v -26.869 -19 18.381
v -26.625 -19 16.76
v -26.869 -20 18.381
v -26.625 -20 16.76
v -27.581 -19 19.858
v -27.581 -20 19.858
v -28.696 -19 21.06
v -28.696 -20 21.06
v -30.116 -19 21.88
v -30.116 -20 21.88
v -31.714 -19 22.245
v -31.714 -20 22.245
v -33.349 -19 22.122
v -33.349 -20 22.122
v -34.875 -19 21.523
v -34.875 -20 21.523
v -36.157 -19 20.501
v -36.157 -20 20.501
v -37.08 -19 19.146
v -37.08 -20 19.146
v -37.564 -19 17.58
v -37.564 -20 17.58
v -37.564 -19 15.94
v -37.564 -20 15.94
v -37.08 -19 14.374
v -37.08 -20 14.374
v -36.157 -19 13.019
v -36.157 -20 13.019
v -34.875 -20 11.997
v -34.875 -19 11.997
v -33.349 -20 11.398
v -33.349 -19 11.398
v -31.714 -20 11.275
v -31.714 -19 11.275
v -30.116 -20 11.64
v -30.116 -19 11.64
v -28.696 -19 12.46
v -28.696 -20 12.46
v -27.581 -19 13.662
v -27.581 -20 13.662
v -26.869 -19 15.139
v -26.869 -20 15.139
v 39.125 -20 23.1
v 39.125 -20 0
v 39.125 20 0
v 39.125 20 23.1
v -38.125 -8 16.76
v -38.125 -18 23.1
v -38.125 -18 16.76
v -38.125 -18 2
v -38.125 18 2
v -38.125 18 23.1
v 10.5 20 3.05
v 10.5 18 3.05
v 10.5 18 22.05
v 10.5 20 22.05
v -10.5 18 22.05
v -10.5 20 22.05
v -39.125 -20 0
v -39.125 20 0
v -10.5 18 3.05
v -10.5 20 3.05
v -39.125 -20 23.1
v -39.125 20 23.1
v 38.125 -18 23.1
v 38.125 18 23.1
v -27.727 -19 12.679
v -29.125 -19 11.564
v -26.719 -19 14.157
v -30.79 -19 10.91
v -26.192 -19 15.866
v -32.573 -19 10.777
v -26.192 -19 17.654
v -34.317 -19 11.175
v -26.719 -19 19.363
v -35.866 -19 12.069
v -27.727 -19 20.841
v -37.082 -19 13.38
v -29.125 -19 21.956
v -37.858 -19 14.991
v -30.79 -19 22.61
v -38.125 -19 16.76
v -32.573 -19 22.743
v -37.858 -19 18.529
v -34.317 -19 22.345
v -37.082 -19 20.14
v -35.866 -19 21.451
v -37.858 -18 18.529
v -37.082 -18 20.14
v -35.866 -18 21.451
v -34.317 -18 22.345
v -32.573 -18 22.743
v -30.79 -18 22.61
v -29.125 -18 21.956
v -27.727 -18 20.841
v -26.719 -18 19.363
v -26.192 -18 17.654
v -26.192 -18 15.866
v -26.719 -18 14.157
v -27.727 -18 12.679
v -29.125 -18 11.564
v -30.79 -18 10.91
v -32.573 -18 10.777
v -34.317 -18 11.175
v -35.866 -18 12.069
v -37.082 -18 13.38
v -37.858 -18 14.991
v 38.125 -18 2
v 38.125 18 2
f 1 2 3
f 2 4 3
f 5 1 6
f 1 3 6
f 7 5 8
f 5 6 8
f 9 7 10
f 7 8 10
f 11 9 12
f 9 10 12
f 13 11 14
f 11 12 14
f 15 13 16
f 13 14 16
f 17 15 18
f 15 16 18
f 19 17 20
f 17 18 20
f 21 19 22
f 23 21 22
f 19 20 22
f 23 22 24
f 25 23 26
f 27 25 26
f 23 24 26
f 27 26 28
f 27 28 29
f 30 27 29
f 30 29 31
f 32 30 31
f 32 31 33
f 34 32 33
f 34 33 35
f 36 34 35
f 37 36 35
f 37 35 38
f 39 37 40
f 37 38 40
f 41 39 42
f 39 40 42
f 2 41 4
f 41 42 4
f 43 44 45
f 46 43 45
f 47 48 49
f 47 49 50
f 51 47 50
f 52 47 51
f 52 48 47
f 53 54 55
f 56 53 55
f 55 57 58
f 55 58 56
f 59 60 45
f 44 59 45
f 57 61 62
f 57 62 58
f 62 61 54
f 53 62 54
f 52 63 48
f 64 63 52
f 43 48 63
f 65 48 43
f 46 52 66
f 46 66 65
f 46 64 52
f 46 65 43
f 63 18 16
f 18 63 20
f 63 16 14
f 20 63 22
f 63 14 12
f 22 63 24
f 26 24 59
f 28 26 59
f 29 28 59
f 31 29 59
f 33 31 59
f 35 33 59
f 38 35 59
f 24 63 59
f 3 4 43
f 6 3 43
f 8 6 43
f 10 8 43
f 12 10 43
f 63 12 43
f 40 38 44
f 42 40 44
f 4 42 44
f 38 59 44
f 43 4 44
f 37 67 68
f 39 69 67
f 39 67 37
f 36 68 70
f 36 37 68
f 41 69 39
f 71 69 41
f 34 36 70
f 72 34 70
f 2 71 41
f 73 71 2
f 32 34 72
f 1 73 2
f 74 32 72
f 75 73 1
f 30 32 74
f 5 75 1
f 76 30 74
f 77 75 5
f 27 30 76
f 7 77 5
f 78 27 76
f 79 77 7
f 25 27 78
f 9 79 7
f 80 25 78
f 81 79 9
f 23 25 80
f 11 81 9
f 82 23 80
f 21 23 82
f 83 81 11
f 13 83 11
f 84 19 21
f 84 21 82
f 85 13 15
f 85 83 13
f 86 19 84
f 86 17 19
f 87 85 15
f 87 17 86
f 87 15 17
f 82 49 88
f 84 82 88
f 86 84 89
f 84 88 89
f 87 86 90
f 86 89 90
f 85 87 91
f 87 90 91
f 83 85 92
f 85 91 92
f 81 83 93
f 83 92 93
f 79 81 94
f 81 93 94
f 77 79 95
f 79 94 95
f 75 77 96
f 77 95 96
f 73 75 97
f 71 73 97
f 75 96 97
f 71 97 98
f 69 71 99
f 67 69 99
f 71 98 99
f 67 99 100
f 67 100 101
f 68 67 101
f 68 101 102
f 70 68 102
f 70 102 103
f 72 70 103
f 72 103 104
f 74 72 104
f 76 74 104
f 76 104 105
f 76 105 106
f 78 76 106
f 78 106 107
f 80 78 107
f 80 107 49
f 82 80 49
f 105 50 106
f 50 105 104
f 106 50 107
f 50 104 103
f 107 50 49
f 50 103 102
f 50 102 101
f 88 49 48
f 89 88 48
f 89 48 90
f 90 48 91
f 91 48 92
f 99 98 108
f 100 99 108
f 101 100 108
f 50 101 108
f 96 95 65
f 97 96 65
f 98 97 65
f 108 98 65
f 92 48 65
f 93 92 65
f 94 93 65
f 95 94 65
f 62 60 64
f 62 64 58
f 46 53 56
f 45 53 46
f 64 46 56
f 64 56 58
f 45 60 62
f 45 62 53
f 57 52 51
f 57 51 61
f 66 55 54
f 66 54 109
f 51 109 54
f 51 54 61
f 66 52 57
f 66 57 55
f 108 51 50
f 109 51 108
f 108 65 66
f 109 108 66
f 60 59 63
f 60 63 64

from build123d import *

# Parameters (mm, degrees)
F0_W           = 78.25
F0_H           = 40
F1_DEPTH       = 23.1
F2_W           = 76.25
F2_H           = 36
F3_DEPTH       = 21.1
F5_D           = 11
F5_DEPTH       = 10
F5_CBORE_D     = 12
F5_CBORE_DEPTH = 1
F7_W           = 21
F7_H           = 19
F8_DEPTH       = 25.4
F8_DEPTH_BACK  = 25.4


with BuildPart() as f1:
    # F0 (on Top) → F1 (new body)
    with BuildSketch(Plane.XY):
        Rectangle(F0_W, F0_H)
    extrude(amount=F1_DEPTH)

    # F2 (on face) → F3 (cut)
    with BuildSketch(Plane.XY.offset(23.1)):
        Rectangle(F2_W, F2_H)
    extrude(amount=-F3_DEPTH, mode=Mode.SUBTRACT)

    # F5
    with Locations(Plane(origin=(0, -18, 0), x_dir=(-1, 0, 0), z_dir=(0, 1, 0))):
        with Locations((32.125, 16.76)):
            CounterBoreHole(F5_D / 2, F5_CBORE_D / 2, F5_CBORE_DEPTH, depth=F5_DEPTH)

    # F7 (on face) → F8 (cut, two sides)
    with BuildSketch(Plane.XZ.offset(-18)) as f8_sk:
        with Locations((0, 12.55)):
            Rectangle(F7_W, F7_H)
    extrude(amount=-F8_DEPTH, mode=Mode.SUBTRACT)
    extrude(f8_sk.sketch, amount=-F8_DEPTH_BACK, mode=Mode.SUBTRACT)


solid = f1.part
